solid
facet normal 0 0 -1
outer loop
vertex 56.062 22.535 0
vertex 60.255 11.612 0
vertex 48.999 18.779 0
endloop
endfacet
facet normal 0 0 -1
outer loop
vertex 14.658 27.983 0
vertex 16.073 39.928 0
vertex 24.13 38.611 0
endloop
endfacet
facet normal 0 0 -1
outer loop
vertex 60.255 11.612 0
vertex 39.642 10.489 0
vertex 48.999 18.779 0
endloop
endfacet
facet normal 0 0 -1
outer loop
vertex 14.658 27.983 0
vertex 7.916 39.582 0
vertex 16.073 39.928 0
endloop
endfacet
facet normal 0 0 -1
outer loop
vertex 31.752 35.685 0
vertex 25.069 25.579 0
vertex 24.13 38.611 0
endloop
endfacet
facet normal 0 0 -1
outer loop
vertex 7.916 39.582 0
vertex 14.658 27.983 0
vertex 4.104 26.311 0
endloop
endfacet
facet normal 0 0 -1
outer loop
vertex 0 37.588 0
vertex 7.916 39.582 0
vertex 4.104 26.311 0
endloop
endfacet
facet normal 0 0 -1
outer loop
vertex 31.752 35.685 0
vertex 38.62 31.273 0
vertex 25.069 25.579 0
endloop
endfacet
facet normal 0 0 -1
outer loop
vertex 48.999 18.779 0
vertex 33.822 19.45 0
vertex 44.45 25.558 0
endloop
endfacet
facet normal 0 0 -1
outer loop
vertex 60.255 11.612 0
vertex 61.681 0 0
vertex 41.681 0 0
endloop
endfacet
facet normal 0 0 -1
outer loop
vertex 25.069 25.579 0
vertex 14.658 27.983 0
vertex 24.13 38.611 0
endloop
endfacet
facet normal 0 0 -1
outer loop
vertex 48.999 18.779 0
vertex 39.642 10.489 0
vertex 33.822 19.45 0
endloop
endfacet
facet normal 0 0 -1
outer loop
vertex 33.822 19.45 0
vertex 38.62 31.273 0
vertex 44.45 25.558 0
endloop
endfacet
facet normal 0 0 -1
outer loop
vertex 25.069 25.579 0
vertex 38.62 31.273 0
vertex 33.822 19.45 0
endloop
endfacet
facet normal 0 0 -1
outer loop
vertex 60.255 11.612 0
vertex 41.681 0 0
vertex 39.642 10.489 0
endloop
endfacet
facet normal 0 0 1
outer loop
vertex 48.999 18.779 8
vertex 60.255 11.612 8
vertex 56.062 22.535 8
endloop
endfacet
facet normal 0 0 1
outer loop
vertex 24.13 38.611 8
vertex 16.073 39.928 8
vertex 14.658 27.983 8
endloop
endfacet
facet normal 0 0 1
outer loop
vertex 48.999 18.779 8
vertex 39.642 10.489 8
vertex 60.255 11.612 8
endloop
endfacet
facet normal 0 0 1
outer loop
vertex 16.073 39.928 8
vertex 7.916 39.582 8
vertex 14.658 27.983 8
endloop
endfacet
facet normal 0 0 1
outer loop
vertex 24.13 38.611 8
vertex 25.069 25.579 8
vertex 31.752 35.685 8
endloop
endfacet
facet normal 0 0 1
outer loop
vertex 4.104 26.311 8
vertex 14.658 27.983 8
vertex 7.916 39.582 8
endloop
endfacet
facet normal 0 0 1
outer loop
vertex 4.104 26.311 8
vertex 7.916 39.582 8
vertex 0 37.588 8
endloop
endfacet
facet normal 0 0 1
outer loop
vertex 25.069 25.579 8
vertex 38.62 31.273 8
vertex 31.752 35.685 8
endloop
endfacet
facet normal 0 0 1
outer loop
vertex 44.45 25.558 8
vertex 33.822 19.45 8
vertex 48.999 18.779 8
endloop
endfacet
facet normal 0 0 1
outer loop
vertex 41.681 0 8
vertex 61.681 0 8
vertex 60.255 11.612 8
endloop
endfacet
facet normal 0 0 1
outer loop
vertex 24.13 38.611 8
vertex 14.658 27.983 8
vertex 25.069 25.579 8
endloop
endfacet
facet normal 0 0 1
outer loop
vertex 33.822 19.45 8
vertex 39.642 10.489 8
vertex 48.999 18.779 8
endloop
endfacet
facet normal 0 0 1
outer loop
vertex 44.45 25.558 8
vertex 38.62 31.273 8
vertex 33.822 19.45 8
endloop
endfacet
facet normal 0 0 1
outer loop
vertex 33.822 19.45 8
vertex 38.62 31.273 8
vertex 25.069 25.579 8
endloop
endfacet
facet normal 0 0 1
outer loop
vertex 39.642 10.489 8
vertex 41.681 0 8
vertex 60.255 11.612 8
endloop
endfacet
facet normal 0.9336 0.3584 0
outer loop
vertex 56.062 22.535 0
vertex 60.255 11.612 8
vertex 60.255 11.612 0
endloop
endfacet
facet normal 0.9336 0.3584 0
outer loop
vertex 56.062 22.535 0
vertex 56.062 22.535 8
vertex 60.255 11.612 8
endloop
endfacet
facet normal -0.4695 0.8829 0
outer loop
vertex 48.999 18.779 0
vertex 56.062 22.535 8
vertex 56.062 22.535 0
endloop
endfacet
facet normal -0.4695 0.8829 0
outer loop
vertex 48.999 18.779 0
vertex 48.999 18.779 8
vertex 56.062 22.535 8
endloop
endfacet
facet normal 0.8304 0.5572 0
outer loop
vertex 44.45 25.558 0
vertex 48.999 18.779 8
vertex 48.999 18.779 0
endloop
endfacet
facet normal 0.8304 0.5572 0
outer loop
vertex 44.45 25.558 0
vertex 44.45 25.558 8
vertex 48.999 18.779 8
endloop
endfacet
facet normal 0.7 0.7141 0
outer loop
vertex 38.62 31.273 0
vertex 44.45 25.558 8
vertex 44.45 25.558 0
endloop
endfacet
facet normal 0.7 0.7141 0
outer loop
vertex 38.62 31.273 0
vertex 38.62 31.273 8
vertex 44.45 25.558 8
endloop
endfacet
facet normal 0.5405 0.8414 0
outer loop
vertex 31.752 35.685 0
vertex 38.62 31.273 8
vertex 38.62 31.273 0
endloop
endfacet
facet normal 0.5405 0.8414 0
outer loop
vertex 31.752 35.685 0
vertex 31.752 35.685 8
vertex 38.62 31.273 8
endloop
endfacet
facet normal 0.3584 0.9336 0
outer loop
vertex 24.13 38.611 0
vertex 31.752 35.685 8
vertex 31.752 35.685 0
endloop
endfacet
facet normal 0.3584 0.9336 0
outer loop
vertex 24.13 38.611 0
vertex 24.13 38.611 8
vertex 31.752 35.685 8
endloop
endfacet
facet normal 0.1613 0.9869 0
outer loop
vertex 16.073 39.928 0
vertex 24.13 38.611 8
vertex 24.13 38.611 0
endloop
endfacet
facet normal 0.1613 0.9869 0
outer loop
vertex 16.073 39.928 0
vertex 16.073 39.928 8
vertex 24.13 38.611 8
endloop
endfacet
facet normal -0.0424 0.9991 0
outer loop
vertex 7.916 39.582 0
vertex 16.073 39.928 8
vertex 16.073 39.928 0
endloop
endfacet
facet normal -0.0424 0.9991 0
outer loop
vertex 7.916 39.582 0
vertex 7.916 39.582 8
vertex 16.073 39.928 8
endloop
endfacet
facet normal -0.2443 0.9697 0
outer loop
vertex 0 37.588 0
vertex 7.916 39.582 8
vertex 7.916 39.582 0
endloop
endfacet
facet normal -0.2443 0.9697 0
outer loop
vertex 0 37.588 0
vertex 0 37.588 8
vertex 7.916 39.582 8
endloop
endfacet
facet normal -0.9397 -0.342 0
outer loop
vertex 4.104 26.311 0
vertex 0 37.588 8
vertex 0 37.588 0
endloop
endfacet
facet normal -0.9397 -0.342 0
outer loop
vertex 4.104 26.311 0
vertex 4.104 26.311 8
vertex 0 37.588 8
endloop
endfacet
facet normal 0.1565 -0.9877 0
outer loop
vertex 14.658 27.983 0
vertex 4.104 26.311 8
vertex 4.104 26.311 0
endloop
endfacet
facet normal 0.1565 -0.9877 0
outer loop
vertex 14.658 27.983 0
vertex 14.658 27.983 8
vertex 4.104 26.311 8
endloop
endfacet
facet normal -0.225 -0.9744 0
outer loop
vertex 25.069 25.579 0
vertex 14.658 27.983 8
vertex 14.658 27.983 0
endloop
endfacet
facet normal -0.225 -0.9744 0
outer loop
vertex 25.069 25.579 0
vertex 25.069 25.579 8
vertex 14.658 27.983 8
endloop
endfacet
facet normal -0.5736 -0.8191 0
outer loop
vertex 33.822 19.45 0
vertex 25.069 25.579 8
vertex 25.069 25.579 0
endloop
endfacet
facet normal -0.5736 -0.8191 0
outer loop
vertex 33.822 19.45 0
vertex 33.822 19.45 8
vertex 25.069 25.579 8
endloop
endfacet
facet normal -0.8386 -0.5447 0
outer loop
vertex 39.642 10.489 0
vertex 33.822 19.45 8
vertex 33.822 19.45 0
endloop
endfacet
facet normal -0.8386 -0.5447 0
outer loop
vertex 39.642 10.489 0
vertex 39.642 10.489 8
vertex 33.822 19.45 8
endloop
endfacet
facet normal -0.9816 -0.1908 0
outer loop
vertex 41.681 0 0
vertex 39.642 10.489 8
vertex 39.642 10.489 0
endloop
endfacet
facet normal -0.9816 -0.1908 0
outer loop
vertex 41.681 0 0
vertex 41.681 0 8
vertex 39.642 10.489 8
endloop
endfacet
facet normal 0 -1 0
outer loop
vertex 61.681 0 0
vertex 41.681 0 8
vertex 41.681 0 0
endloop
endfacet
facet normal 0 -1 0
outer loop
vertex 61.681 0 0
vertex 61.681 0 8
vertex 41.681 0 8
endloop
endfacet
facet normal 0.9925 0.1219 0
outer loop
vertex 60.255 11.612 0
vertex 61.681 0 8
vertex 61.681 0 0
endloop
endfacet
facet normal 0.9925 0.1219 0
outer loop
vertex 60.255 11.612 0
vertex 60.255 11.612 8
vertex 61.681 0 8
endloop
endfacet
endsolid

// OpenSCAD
$fn = 32;

// ----------------------------------------------------------------------
// Arc stop: segment, 8 mm thick
// ----------------------------------------------------------------------

// --- parameters (mm) ---
profile_height = 8;       // extrusion height
profile_points = 17;      // points of the closed outline

profile = [[61.681, 0], [60.255, 11.612], [56.062, 22.535], [48.999, 18.779], [44.45, 25.558], [38.62, 31.273], [31.752, 35.685], [24.13, 38.611], [16.073, 39.928], [7.916, 39.582], [0, 37.588], [4.104, 26.311], [14.658, 27.983], [25.069, 25.579], [33.822, 19.45], [39.642, 10.489], [41.681, 0]];  // single closed polygon, 17 points, counter clockwise

// --- the one profile operation ---
linear_extrude(height = profile_height) polygon(points = profile);
